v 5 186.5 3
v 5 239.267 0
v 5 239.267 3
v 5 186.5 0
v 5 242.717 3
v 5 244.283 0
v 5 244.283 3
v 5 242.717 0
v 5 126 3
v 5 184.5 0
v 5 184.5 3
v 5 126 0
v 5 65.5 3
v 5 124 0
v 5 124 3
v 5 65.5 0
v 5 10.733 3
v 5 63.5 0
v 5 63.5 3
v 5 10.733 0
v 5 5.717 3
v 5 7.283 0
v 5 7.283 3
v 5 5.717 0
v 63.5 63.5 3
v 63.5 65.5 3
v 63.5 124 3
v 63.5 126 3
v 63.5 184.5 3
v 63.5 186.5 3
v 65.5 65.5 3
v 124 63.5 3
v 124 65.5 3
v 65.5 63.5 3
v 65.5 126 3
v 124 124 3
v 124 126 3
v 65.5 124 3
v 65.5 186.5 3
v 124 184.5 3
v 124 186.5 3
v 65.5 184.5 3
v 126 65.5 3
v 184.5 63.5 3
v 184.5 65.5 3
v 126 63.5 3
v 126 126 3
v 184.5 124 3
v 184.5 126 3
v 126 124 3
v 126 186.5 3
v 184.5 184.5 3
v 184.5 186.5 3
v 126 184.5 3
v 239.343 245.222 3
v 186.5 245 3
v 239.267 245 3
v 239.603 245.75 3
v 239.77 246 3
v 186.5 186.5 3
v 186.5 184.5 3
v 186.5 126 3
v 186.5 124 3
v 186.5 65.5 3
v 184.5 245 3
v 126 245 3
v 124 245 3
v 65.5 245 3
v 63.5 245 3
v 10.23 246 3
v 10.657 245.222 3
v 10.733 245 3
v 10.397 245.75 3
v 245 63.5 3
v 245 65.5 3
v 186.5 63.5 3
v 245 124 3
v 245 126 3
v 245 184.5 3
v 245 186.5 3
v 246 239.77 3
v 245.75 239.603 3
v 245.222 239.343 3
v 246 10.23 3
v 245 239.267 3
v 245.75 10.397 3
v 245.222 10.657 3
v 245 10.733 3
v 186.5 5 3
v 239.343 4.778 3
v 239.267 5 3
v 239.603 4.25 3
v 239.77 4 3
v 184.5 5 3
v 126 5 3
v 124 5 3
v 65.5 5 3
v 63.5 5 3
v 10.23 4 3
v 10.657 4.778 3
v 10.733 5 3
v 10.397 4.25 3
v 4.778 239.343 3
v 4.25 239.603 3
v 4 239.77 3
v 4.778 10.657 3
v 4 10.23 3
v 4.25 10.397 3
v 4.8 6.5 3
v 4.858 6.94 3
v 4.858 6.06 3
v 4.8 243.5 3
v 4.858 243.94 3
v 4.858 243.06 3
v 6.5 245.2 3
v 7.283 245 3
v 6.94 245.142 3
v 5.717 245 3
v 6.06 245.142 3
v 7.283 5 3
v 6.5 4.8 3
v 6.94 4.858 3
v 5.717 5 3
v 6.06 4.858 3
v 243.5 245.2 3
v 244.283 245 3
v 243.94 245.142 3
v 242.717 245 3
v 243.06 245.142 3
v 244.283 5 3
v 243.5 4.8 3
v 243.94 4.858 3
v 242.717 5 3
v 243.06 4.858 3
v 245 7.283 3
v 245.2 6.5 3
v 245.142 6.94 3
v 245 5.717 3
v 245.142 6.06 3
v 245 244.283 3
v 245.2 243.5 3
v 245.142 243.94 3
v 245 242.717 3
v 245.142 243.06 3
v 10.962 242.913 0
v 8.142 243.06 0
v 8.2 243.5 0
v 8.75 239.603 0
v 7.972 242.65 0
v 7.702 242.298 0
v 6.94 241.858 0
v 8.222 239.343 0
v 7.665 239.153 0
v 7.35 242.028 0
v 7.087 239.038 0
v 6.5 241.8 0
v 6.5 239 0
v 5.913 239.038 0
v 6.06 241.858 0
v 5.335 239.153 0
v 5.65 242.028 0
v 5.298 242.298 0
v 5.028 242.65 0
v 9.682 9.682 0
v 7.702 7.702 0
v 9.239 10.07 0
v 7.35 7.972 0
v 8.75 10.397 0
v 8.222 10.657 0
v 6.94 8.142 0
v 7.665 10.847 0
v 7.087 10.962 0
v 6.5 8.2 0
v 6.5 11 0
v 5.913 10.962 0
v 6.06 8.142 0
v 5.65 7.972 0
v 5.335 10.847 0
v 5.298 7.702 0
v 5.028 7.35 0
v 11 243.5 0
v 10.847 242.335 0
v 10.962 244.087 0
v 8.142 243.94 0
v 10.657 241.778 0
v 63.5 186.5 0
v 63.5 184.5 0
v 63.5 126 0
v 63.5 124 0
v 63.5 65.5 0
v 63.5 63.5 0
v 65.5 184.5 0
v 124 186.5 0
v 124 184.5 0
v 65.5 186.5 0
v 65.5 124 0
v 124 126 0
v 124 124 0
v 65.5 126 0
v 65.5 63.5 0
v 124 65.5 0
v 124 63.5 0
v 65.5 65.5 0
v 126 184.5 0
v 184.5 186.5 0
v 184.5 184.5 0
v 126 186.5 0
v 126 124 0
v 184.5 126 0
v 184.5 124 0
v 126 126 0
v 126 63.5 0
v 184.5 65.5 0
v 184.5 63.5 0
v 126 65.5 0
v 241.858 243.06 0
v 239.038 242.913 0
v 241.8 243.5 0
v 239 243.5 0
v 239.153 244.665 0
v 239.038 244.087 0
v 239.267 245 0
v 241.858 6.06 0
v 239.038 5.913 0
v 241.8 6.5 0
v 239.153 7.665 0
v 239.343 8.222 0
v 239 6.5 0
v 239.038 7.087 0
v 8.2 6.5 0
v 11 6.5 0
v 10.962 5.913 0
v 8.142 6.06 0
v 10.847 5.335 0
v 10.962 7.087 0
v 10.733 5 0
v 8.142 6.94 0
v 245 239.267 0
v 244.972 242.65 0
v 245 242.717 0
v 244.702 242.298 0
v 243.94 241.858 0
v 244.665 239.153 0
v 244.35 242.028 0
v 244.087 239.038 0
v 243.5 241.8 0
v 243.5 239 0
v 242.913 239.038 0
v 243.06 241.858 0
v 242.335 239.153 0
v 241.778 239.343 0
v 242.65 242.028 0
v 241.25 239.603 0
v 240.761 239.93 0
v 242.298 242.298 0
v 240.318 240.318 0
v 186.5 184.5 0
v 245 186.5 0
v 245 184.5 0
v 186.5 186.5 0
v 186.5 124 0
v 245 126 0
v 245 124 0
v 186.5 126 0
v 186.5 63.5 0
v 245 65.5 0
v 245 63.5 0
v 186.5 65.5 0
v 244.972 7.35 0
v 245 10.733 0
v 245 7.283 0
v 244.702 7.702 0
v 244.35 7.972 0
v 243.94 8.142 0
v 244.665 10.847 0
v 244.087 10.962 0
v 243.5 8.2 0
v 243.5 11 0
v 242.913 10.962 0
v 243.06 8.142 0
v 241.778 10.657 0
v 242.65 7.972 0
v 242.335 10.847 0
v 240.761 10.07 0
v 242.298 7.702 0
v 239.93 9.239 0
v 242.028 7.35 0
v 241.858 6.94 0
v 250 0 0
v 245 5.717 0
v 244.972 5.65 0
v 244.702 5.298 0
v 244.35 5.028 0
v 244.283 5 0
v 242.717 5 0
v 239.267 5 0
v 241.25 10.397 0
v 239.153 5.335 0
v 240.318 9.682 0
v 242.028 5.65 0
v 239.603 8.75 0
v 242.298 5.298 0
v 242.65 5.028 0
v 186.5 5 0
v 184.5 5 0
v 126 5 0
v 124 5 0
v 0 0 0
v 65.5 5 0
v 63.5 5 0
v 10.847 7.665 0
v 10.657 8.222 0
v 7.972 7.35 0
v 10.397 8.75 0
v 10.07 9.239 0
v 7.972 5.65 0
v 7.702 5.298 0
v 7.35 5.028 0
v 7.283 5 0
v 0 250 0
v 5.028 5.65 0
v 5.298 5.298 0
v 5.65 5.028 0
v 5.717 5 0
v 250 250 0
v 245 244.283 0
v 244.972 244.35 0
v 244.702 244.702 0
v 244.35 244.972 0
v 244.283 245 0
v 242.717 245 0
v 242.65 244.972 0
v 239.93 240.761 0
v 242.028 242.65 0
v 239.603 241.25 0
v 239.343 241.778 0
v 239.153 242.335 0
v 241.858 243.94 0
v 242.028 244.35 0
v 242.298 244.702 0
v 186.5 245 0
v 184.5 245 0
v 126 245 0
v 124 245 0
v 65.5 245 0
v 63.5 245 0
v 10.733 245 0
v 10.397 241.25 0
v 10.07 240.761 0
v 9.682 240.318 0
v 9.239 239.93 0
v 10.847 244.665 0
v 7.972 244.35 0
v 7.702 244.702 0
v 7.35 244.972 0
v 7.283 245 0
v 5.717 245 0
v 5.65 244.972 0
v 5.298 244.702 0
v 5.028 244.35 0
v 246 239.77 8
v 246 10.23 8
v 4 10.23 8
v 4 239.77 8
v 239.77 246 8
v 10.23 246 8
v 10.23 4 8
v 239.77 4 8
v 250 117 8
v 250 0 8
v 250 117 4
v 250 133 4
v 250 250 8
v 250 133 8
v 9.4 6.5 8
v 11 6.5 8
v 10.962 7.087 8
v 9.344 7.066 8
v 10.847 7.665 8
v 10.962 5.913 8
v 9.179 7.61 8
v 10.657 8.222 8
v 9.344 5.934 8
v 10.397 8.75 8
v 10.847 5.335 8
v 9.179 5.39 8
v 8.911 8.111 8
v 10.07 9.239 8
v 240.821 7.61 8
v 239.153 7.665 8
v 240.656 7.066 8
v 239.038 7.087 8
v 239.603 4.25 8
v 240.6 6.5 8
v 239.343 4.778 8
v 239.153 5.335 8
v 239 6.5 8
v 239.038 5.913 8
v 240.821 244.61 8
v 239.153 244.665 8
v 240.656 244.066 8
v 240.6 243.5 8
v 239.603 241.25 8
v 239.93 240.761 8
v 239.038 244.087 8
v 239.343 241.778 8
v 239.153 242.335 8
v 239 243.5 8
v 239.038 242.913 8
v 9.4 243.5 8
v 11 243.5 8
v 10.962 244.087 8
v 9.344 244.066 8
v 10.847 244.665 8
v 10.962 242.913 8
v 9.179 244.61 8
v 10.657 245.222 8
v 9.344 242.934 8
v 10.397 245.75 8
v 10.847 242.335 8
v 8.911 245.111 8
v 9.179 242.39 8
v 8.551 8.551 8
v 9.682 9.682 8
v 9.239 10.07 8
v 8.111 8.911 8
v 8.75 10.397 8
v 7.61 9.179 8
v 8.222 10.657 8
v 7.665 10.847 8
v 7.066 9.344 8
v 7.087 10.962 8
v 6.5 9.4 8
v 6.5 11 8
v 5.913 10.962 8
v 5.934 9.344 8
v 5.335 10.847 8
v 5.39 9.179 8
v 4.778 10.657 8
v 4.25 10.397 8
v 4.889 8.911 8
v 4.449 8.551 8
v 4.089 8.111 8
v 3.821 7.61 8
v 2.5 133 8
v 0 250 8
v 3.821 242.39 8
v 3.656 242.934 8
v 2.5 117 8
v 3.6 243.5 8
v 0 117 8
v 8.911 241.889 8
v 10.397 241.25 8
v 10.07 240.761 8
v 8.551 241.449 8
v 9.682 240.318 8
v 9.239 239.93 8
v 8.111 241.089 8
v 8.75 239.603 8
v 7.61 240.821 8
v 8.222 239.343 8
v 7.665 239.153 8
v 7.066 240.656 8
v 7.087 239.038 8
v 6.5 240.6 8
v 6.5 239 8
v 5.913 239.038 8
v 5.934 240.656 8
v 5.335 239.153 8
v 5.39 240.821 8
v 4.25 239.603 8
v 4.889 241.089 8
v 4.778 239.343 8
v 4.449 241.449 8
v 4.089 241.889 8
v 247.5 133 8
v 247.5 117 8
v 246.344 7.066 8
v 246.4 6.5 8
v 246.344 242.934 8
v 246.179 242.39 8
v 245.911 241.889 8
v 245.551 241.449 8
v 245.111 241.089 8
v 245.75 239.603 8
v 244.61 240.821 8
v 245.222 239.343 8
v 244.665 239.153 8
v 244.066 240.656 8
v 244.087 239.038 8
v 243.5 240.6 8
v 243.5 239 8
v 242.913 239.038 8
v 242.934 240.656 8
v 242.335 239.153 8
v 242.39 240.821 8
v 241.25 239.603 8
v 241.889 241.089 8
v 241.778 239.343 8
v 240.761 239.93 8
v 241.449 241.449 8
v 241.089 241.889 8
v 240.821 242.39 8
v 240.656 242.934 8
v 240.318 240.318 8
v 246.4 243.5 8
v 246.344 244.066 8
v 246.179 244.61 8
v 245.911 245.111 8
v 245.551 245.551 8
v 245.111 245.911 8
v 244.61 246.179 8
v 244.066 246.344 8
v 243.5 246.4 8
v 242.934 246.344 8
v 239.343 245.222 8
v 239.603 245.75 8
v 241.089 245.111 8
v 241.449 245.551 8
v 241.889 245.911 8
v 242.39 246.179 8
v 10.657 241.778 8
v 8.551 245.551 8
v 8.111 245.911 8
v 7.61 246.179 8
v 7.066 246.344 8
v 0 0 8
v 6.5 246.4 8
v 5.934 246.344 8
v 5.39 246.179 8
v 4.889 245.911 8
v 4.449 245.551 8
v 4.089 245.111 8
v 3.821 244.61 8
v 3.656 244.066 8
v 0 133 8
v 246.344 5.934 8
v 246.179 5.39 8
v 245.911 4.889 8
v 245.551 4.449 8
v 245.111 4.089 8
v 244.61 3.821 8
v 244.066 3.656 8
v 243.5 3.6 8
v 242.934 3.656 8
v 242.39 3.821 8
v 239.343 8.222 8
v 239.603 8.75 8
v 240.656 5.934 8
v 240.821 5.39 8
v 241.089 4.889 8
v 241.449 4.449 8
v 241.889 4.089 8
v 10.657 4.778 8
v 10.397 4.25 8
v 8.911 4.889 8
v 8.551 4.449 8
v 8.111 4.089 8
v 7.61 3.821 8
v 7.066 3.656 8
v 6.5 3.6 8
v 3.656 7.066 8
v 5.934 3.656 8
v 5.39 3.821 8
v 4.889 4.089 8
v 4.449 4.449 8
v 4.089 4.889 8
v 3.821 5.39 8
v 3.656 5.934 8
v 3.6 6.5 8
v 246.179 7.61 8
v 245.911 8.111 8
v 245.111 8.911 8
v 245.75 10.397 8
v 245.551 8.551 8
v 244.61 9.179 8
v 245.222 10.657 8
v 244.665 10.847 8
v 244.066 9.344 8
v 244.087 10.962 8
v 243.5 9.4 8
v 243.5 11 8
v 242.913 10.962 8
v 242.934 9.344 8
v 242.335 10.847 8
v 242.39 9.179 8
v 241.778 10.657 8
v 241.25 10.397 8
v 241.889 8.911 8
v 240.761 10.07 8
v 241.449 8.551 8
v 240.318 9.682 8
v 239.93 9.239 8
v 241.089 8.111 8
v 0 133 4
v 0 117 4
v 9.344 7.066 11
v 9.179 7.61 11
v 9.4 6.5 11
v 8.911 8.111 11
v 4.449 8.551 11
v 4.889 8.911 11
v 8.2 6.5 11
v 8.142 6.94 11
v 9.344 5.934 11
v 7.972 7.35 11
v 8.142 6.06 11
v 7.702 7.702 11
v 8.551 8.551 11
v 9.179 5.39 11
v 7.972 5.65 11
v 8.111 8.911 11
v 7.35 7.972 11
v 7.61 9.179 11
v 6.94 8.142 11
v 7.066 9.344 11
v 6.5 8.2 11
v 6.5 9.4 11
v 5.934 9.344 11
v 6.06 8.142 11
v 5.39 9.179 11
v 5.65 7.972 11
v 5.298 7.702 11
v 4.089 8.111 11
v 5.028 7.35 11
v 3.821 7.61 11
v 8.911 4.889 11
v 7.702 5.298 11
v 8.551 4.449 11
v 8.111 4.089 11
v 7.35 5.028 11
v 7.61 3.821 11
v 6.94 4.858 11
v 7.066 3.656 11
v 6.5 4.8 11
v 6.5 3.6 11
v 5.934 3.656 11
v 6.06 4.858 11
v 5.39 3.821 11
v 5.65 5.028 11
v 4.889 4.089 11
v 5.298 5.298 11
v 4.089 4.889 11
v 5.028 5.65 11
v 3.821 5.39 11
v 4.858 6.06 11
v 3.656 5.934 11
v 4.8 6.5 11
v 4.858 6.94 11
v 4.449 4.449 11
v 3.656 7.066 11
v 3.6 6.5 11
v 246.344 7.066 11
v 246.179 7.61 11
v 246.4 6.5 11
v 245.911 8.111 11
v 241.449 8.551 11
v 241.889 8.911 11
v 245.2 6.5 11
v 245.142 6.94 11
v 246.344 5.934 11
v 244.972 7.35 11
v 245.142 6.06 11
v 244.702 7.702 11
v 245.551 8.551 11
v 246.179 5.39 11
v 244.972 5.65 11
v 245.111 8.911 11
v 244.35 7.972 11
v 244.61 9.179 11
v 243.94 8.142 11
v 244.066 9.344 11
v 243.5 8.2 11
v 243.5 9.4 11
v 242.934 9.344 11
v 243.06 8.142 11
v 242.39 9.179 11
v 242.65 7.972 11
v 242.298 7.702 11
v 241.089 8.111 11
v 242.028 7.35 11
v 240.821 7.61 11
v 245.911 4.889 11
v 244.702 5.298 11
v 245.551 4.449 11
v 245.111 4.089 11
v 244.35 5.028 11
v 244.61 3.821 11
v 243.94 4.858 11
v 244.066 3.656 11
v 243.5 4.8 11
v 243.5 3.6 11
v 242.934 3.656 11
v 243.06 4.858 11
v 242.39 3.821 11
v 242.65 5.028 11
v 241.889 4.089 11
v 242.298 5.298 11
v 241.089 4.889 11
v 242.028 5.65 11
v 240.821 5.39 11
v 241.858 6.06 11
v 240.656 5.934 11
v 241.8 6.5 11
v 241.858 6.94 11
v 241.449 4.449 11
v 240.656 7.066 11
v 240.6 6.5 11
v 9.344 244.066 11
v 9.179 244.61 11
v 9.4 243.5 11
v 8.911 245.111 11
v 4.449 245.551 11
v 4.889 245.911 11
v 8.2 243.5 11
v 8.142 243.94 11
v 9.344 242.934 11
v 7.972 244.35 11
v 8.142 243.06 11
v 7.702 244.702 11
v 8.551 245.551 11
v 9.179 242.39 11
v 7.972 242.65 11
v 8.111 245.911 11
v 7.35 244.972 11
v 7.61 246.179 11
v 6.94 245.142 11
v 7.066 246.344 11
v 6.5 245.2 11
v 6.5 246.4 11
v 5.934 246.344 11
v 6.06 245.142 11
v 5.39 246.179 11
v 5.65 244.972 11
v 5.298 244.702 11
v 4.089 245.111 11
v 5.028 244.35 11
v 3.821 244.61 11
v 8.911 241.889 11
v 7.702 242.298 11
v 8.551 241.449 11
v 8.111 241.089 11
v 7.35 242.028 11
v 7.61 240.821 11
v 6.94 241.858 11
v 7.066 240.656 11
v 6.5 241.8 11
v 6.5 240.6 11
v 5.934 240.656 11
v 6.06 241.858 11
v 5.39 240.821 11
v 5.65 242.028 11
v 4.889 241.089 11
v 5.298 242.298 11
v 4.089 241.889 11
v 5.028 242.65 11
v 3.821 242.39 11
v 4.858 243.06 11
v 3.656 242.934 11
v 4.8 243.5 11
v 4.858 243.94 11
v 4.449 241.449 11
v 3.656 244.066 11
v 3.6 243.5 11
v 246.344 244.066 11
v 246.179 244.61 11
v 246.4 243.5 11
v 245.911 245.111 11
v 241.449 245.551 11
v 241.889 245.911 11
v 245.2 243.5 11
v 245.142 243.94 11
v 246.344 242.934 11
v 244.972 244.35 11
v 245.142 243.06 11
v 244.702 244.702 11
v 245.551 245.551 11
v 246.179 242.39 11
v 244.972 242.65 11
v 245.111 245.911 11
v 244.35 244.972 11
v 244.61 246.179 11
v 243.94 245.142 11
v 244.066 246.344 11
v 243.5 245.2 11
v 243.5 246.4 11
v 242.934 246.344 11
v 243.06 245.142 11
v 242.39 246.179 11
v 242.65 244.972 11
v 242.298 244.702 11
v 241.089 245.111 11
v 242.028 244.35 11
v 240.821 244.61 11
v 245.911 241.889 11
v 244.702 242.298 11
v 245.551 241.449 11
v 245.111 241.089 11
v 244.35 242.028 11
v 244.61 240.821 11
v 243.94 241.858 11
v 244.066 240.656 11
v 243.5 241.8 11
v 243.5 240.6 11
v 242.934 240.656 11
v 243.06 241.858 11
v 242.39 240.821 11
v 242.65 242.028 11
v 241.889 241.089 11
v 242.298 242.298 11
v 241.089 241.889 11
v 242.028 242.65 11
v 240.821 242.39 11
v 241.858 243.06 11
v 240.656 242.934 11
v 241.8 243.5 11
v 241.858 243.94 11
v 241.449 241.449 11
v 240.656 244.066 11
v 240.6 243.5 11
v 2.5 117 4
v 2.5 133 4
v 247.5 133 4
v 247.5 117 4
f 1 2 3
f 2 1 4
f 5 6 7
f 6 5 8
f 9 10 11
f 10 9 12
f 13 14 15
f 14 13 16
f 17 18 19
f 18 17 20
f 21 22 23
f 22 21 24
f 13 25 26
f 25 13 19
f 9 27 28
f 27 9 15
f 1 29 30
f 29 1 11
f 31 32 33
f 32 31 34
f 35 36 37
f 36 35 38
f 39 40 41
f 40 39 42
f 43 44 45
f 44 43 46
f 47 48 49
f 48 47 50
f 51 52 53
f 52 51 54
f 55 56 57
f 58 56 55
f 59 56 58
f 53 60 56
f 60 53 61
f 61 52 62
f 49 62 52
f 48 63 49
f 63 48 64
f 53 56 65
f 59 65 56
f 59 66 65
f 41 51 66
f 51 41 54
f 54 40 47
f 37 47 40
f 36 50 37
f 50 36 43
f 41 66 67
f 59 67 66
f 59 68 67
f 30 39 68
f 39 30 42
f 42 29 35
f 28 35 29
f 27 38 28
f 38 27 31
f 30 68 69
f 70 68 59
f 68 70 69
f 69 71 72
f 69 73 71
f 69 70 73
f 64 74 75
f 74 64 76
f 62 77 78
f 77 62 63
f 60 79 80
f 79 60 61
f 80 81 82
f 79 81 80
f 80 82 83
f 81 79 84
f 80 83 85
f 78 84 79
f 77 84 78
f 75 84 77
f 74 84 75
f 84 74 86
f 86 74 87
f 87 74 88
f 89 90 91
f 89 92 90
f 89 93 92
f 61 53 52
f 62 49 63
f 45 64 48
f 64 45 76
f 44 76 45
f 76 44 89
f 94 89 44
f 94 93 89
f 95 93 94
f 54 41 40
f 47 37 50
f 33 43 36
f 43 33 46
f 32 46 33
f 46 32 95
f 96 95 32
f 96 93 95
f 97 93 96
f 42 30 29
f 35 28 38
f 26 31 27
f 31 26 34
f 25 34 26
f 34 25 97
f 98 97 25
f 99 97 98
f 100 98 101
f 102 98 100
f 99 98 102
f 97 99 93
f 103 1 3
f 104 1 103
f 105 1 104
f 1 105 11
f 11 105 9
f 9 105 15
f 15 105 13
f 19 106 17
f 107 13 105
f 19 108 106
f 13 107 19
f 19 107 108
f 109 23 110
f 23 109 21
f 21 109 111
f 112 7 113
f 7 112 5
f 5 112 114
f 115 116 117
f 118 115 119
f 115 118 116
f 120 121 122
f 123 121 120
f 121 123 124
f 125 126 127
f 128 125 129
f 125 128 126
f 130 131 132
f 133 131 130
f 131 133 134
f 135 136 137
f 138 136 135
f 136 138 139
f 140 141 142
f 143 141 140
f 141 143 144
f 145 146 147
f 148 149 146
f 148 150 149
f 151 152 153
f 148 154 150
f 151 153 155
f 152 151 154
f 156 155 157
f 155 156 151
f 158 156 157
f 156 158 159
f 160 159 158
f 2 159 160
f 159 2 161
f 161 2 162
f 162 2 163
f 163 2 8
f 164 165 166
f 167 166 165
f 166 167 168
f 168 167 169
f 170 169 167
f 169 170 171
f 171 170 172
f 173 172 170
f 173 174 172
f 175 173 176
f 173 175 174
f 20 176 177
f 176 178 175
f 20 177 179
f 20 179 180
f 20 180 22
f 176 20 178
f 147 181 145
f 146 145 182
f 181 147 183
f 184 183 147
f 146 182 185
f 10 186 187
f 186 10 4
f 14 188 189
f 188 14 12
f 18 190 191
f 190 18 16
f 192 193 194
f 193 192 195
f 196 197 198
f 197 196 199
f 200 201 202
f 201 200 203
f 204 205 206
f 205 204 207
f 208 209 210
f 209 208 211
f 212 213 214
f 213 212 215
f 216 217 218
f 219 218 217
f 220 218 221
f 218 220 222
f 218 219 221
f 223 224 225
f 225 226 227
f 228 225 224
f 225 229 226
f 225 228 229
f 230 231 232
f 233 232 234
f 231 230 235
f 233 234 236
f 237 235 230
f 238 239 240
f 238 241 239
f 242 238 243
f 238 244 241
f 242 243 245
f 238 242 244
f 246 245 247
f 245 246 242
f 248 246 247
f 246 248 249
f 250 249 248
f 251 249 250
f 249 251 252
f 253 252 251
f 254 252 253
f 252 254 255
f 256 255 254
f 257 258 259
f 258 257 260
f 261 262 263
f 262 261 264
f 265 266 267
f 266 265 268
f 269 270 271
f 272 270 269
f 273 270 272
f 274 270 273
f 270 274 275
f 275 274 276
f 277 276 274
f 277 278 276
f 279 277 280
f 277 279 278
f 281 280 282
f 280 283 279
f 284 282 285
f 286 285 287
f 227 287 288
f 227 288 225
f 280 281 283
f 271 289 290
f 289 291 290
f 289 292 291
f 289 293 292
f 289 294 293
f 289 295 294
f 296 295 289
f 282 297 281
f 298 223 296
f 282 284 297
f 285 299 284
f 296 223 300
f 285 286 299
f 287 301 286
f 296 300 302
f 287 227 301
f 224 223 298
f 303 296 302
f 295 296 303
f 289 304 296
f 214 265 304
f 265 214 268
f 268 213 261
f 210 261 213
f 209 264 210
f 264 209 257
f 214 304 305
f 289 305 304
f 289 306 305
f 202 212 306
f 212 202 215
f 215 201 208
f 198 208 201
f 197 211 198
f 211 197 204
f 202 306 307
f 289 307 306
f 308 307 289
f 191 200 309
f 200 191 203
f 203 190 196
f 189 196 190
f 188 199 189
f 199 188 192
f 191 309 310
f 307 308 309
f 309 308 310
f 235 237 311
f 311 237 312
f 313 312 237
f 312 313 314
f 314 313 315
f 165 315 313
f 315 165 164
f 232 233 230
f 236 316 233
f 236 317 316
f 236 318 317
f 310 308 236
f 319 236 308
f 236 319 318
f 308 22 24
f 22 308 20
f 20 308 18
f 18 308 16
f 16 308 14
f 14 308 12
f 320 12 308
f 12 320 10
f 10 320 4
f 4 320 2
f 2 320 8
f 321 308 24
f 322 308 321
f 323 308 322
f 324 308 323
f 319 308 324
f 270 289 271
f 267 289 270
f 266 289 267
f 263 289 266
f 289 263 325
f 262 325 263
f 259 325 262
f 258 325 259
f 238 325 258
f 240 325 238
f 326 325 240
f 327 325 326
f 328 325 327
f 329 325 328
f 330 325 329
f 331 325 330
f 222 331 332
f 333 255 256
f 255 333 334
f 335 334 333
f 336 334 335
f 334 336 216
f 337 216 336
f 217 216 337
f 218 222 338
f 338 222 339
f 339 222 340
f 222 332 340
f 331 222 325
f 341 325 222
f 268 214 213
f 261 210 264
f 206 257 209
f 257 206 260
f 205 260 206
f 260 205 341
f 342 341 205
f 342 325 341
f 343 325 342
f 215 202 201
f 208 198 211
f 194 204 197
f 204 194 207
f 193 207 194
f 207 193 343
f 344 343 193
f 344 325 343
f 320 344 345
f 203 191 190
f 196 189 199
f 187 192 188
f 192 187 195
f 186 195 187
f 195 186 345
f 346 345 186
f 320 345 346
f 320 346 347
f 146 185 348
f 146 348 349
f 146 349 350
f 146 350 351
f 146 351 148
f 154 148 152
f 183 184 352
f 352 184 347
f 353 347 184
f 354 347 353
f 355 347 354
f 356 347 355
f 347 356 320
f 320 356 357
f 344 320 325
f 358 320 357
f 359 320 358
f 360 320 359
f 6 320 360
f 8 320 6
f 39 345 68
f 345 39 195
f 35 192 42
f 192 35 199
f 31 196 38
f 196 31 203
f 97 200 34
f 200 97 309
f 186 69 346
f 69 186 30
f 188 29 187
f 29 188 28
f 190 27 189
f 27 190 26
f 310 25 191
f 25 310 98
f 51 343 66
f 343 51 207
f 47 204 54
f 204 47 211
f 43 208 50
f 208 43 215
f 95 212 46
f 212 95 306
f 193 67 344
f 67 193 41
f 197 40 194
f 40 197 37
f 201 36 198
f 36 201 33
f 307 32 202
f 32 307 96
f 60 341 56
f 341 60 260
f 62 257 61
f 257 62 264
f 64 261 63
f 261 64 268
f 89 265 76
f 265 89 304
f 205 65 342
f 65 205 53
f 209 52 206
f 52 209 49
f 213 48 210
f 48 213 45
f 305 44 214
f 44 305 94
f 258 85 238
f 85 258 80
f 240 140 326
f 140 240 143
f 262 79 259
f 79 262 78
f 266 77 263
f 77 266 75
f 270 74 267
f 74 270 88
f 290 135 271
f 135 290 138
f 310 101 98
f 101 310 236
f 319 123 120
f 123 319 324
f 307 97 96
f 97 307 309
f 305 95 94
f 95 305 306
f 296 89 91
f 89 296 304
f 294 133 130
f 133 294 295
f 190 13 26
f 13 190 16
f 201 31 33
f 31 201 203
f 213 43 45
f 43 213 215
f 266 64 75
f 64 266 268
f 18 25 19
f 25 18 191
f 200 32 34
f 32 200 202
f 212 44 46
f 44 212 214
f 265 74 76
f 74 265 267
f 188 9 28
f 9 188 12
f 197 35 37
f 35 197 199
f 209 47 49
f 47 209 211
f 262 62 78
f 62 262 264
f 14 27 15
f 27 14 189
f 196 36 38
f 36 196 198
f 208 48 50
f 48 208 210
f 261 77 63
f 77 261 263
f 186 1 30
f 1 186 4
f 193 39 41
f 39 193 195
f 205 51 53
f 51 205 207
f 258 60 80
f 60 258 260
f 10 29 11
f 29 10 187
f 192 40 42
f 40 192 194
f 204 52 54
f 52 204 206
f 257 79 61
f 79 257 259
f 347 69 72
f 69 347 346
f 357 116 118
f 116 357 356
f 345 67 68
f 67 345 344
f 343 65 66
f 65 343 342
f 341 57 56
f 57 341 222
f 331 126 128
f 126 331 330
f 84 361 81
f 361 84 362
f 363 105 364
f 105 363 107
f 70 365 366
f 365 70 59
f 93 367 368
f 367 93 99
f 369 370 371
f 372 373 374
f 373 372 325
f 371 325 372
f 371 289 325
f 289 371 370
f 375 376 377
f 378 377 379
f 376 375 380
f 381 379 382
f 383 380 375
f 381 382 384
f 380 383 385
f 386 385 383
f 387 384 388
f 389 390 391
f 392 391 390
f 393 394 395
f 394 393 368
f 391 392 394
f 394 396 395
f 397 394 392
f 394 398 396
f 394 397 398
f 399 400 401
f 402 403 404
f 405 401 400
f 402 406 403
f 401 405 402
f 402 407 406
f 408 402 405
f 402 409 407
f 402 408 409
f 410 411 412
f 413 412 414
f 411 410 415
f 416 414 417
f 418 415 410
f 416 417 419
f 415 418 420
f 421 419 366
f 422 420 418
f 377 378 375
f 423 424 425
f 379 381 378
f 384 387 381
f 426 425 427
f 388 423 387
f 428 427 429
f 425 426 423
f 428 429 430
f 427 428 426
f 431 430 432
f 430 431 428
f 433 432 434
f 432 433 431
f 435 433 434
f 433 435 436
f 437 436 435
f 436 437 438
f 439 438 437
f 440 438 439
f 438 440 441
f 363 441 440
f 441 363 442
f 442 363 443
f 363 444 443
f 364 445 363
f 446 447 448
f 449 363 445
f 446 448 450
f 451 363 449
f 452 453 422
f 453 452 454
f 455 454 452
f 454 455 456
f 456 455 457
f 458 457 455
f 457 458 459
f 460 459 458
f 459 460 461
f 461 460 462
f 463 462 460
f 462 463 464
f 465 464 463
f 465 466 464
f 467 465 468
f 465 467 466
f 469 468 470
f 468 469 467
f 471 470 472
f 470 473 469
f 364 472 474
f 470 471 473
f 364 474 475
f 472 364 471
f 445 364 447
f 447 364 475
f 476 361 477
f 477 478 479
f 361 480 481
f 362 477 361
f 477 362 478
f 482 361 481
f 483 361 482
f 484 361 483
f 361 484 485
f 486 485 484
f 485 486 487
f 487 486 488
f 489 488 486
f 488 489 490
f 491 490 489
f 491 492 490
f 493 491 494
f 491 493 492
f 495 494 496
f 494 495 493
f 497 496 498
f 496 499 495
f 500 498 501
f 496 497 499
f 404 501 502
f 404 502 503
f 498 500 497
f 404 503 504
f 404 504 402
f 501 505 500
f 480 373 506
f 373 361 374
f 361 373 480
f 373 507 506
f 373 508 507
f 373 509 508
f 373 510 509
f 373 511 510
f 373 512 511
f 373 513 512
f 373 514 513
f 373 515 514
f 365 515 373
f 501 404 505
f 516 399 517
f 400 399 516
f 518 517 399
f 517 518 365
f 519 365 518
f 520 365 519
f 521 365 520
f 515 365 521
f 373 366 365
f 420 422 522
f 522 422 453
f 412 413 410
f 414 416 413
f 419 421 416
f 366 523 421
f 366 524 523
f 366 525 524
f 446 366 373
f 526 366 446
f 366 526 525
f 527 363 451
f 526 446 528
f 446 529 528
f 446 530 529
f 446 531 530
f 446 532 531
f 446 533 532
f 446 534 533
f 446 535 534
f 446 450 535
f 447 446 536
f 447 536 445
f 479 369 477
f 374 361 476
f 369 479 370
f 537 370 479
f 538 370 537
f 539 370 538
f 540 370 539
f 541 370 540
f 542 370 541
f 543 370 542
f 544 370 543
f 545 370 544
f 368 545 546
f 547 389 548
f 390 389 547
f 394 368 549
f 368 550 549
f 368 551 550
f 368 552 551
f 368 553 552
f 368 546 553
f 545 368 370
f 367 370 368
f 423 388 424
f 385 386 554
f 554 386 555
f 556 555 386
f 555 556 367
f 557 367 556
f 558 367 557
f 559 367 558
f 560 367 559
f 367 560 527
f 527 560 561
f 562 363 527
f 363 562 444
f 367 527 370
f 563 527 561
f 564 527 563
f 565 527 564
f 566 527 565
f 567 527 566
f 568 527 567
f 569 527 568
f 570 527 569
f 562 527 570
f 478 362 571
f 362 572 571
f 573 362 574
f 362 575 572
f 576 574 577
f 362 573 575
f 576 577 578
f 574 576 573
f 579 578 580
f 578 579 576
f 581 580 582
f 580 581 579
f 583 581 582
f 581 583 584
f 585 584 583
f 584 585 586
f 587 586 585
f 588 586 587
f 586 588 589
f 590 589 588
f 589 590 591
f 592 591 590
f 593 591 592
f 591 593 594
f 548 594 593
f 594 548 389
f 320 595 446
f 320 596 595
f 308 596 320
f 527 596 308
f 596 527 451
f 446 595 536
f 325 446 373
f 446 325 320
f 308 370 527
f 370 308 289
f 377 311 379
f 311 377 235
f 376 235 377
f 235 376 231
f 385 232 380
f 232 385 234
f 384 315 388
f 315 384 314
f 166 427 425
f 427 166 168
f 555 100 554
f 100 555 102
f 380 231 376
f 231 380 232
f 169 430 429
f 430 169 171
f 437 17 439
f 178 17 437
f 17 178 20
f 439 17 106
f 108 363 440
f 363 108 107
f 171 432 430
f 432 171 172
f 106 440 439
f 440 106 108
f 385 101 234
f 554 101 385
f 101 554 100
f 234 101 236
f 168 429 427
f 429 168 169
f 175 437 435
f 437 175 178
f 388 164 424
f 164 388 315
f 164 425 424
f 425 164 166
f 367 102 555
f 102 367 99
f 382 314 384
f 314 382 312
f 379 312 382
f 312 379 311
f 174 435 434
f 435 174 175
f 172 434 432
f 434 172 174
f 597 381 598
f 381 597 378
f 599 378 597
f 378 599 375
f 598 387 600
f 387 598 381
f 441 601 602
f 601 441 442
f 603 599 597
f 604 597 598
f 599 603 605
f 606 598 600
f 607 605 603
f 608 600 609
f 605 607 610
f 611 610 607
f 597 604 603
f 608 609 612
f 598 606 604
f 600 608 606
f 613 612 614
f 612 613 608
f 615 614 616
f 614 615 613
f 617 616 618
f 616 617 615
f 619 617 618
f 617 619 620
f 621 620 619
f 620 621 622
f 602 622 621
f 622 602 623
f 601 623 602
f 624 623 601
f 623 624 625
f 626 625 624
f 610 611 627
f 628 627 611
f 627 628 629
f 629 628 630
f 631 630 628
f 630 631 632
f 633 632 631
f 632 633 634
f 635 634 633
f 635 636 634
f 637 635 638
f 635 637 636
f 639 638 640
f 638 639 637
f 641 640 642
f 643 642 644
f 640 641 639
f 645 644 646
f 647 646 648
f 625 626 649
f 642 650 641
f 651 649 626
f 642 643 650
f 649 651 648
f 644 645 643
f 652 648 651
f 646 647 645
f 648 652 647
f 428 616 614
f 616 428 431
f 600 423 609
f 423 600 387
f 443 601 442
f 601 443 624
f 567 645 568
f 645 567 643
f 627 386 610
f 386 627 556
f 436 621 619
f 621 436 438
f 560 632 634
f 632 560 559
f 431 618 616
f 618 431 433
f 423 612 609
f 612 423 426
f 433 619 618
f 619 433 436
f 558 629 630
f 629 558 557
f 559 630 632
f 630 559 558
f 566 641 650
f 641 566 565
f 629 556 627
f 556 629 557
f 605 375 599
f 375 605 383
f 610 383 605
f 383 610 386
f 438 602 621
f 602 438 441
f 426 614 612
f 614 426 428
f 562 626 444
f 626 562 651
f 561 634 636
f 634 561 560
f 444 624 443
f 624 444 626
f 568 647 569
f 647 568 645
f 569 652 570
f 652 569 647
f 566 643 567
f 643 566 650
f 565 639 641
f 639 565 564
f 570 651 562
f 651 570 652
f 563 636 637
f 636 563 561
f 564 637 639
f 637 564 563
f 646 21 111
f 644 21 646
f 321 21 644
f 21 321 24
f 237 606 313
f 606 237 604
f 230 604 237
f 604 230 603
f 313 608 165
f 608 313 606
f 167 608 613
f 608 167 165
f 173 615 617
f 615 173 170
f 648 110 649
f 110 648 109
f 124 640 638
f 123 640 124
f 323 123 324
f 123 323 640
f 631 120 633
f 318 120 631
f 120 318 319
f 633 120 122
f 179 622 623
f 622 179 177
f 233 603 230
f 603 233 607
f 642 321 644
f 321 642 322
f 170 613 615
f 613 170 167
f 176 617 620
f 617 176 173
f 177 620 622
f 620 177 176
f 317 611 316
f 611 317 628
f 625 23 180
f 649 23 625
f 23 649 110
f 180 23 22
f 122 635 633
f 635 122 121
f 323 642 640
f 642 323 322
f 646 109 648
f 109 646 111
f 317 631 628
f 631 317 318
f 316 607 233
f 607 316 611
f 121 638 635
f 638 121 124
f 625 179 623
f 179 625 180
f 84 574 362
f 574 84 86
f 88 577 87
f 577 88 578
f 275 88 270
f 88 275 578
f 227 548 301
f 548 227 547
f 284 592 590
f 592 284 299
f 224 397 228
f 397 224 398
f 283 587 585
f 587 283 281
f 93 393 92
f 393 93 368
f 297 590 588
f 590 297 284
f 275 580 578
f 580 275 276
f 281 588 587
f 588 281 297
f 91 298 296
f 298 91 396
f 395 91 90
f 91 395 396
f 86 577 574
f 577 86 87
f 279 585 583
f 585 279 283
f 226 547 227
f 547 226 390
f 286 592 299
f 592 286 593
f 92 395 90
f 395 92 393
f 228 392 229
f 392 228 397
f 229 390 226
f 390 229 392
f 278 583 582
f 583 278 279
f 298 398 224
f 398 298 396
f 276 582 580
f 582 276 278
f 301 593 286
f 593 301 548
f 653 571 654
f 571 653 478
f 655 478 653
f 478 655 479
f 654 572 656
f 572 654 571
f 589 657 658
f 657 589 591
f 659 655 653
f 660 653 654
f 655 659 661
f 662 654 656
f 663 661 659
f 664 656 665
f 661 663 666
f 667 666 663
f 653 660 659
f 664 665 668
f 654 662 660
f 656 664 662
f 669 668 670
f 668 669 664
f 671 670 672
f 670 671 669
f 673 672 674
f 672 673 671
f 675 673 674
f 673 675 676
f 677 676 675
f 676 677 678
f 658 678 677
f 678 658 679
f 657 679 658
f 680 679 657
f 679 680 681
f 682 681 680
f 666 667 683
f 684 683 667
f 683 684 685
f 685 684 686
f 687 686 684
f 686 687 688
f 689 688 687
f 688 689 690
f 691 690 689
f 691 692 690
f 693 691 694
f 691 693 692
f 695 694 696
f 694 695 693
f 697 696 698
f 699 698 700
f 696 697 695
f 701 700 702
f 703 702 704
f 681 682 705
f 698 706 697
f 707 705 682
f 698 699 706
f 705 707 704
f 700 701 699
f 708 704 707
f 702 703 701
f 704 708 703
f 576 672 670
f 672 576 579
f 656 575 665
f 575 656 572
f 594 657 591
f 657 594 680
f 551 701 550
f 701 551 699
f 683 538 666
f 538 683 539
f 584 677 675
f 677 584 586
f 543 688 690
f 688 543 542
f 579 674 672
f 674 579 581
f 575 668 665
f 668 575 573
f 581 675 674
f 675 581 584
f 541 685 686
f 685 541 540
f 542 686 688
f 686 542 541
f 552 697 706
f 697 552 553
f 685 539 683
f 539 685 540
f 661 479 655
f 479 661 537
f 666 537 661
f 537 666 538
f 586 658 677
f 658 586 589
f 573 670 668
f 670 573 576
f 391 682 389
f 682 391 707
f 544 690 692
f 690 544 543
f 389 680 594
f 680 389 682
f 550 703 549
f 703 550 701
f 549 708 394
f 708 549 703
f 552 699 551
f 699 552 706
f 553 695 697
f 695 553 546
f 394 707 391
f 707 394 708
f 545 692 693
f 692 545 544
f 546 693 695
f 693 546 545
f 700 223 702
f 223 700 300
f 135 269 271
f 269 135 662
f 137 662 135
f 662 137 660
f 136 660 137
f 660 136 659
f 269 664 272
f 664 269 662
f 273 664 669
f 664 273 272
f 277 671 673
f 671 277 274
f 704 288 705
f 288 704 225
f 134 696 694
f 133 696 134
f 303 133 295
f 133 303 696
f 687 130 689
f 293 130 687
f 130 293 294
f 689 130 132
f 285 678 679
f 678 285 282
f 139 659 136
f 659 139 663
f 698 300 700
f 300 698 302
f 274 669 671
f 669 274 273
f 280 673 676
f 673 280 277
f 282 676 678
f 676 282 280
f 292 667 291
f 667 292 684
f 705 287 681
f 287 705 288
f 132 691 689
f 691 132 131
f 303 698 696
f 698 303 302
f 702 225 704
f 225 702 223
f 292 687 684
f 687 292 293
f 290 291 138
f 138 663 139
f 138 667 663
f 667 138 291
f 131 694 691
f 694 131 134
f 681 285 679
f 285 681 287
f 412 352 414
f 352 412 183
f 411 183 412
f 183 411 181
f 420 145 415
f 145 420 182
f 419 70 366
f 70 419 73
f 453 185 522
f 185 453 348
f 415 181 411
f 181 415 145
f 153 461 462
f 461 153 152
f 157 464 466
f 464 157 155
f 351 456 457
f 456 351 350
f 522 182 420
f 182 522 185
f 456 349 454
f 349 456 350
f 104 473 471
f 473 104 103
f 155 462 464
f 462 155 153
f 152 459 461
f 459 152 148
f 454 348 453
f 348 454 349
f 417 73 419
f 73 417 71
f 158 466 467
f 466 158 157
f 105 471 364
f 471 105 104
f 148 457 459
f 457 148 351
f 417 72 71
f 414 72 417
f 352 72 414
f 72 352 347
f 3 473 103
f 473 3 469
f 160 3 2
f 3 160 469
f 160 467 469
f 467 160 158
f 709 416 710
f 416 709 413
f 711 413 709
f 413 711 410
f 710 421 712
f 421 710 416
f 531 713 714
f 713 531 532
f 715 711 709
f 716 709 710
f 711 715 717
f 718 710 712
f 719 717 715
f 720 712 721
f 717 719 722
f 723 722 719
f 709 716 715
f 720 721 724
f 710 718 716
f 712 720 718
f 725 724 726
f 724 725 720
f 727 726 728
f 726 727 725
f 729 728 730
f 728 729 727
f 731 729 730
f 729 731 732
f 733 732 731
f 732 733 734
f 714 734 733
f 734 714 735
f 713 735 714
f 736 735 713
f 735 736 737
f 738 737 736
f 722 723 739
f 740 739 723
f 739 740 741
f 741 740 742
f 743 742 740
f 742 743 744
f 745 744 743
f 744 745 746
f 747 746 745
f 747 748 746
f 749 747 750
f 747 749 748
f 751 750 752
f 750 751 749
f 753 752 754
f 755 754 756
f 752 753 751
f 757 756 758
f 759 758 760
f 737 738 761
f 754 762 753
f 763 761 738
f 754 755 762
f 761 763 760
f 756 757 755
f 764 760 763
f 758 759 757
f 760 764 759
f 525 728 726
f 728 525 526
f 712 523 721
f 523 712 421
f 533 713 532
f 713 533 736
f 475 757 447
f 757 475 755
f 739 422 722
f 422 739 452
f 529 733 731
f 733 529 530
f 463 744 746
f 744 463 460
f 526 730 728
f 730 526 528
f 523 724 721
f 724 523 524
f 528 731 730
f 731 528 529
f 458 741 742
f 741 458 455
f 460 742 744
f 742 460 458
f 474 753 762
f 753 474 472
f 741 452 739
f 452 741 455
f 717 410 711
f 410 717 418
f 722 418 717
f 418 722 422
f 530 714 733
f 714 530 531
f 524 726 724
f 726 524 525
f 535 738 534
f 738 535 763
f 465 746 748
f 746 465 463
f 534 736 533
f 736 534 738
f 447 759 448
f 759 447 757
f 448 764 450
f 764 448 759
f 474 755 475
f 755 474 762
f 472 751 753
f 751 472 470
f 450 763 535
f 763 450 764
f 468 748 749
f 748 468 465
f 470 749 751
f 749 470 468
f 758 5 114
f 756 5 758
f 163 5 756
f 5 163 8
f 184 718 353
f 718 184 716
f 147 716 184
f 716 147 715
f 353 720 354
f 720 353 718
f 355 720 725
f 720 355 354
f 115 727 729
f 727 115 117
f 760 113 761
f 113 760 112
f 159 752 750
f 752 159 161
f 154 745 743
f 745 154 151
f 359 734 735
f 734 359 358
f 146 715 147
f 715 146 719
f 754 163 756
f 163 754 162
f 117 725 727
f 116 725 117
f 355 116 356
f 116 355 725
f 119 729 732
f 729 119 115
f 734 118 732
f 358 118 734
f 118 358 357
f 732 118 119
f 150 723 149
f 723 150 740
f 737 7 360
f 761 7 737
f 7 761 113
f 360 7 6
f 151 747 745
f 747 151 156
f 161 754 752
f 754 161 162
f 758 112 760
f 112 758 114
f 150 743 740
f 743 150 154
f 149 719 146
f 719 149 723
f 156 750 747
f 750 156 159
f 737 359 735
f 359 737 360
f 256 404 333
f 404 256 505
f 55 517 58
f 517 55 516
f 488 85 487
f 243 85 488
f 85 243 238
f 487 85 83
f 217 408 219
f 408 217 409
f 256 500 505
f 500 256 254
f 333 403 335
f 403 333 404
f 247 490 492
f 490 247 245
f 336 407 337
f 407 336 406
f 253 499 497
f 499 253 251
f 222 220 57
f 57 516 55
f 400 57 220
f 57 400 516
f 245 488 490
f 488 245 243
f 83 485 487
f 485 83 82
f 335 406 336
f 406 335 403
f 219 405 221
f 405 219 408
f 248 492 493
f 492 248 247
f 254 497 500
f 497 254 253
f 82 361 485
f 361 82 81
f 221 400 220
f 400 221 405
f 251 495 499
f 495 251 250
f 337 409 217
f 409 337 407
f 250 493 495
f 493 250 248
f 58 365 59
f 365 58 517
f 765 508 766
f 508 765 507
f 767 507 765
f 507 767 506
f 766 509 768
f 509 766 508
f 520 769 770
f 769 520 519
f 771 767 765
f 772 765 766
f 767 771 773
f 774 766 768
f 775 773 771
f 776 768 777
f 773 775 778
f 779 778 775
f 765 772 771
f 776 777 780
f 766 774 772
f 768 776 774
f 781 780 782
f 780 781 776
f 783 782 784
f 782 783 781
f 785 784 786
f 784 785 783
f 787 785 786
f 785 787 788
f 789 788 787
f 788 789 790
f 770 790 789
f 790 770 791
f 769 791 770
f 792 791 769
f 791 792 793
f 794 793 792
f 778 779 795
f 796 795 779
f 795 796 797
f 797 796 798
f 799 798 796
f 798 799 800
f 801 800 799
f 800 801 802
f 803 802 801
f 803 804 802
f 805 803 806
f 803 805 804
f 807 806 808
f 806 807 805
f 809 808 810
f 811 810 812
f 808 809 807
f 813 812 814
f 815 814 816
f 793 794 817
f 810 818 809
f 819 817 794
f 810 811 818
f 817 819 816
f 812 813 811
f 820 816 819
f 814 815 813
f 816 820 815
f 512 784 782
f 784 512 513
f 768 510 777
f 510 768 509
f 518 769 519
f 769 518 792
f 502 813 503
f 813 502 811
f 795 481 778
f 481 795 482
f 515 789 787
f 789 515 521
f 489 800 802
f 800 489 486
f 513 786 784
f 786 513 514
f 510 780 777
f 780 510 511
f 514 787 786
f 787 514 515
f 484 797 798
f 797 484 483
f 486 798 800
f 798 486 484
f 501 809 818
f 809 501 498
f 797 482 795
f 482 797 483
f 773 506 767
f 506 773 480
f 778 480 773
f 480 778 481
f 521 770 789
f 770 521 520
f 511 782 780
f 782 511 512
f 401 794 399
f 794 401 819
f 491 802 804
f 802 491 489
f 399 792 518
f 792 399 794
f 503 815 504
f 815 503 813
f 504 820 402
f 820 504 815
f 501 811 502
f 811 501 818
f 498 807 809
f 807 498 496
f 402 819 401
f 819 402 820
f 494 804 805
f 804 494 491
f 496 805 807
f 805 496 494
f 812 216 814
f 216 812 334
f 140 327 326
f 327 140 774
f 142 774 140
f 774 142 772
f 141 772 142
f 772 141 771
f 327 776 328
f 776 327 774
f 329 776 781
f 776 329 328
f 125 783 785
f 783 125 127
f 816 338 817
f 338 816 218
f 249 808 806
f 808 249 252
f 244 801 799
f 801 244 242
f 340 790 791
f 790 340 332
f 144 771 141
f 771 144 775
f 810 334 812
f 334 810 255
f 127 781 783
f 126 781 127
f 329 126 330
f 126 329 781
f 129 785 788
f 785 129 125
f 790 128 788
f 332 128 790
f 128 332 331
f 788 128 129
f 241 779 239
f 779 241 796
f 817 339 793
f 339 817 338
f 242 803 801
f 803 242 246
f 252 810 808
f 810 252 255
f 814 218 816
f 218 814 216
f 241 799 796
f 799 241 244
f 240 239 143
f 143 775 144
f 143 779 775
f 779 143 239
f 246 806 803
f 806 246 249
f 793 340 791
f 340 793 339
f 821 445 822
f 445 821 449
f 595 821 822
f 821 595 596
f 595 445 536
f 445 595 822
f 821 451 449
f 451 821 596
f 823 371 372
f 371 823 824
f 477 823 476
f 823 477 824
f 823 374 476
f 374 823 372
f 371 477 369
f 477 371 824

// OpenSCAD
// =====================================================================
// FUZE / Helios — Down Sandwich Test Frame  (V3 clamshell, 2026-06-04)
// Two separate halves, NO printed hinge. Lift the lid right off to lay an
// even layer of free-form down in the tray; set the lid back (a perimeter
// set the lid back and clamp with 4 corner screws. Mesh on BOTH outer
// faces. Hangs vertically: a top rail slides into a side-loading C-channel.
//
//   PART = "tray"    -> deep half (10 mm down cavity)        [print 1]
//   PART = "lid"     -> mesh lid half                        [print 1]
//   PART = "channel" -> side-loading C-channel (load cell)   [print 1]
//   PART = "both"    -> tray + lid + channel preview
//
// Material: PC (PETG later). Print each half FLAT, mesh-face DOWN.
// MESH: pause-embed at layer 8 = Z 1.5 mm @ 0.2 mm layers (both halves).
// =====================================================================

PART = "lid";
$fn = 48;

SIZE     = 250;     // outer square (mm)
WALL     = 4;       // frame wall thickness
CAV      = 10;      // down cavity depth (tray)
FLOOR_H  = 3.0;     // mesh-support rib plane (1.5 backing + 1.5 cap, mesh @ layer 8)
RIB_W    = 2.0;     // rib width
CELLS    = 4;       // NxN support-rib cells
CLR      = 0.4;     // fit clearance

TRAY_T = FLOOR_H + CAV;   // tray wall height (13)
LID_RIM = 5.0;            // lid wall height
LID_T   = FLOOR_H + LID_RIM;


// corner closure screws (M3)
SCREW_CLR = 3.4;    // clearance hole (lid)
INSERT_D  = 4.2;    // M3 heat-set insert bore (tray)
INSERT_H  = 6.0;
BOSS_D    = 9;
INSET     = BOSS_D/2 + 2;   // boss center inset from the corner

// top hang tab (flat, in the plane of the frame, sticks OUT past the top edge so
// it never conflicts with the lid) + side-loading C-channel that grips the tab.
RAIL_LEN = 150;   // tab width along the top edge (X)
RAIL_OUT = 16;    // how far the tab sticks out past the top edge (Y)
RAIL_T   = 6;     // tab thickness (Z) — what the channel grips
CH_CLR = 0.5; CH_WALL = 3; CH_LEN = RAIL_LEN + 30;
// locking pins: 2 holes through channel-lip + tab + channel-lip; drop M3 screws/pins
LOCK_D    = 3.4;          // M3 clearance / 3 mm pin
LOCK_SP   = 90;           // spacing between the 2 lock holes
LOCK_Y    = RAIL_OUT/2;   // depth into the tab where the holes sit

WIN = SIZE - 2*WALL;
EPS = 0.01;

// ---------------------------------------------------------------
module sq(s,h){ cube([s,s,h]); }

module rib_grid(h){
    step = WIN/CELLS;
    intersection(){
        union(){
            for(i=[0:CELLS]) translate([i*step-RIB_W/2,0,0]) cube([RIB_W,WIN,h]);
            for(j=[0:CELLS]) translate([0,j*step-RIB_W/2,0]) cube([WIN,RIB_W,h]);
        }
        cube([WIN,WIN,h]);
    }
}
module ring(h){ difference(){ sq(SIZE,h); translate([WALL,WALL,-EPS]) sq(WIN,h+2*EPS);} }

// 4 corner positions
function corners() = [[INSET,INSET],[SIZE-INSET,INSET],[INSET,SIZE-INSET],[SIZE-INSET,SIZE-INSET]];

// registration via the corner bosses: lid POST drops into tray SOCKET, then screw.
// Socket and post are DECOUPLED so the post can shrink without re-cutting the tray.
REG_SOCKET_D = 6.8;   // TRAY socket diameter — UNCHANGED (matches the 6 trays already printed)
REG_POST_D   = 5.8;   // LID post diameter — loose slip fit (~0.5mm/side; was 6.5 = too tight)
REG_H        = 3.0;   // engagement depth (socket depth = post height)

module tray_bosses(){          // socket on top (receives the lid post) + insert below it
    for(c=corners()) translate([c[0],c[1],0])
        difference(){
            cylinder(d=BOSS_D,h=TRAY_T);
            translate([0,0,TRAY_T-REG_H]) cylinder(d=REG_SOCKET_D, h=REG_H+EPS, $fn=32);           // registration socket
            translate([0,0,TRAY_T-REG_H-INSERT_H]) cylinder(d=INSERT_D, h=INSERT_H+EPS, $fn=24);   // heat-set insert bore (below socket)
        }
}
module lid_bosses(){           // boss + registration POST above the mating face; screw hole through
    for(c=corners()) translate([c[0],c[1],0])
        difference(){
            union(){ cylinder(d=BOSS_D,h=LID_T); translate([0,0,LID_T-EPS]) cylinder(d=REG_POST_D, h=REG_H+EPS, $fn=32); }
            translate([0,0,-EPS]) cylinder(d=SCREW_CLR, h=LID_T+REG_H+2*EPS, $fn=24);
        }
}

// Flat hang tab: a plate sticking OUT past the top edge (+Y), thickness in Z.
// Sits at the top of the tray wall so the lid (which stacks in +Z) clears it.
module hang_tab(){
    difference(){
        translate([(SIZE-RAIL_LEN)/2, SIZE-EPS, TRAY_T-RAIL_T])
            cube([RAIL_LEN, RAIL_OUT+EPS, RAIL_T]);
        for(sx=[SIZE/2-LOCK_SP/2, SIZE/2+LOCK_SP/2])
            translate([sx, SIZE+LOCK_Y, TRAY_T-RAIL_T-EPS]) cylinder(d=LOCK_D, h=RAIL_T+2*EPS, $fn=24);
    }
}
// C-channel grips the tab top+bottom (Z) and the back (Y); the tab slides in from
// one X end to an end-stop; the front (toward the frame) is open so the neck passes.
module c_channel(){
    slotY = RAIL_OUT + CH_CLR;            // tab depth into the channel (Y)
    slotZ = RAIL_T + CH_CLR;              // tab thickness (Z)
    outerY = slotY + CH_WALL;             // back wall
    outerZ = slotZ + 2*CH_WALL;           // top + bottom lips
    difference(){
        cube([CH_LEN, outerY, outerZ]);
        // pocket: open at X=0 (insert) and at Y=0 (front, frame neck passes); far X end = stop
        translate([-EPS, -EPS, CH_WALL]) cube([CH_LEN-CH_WALL, slotY, slotZ]);
        // mount holes on the back flange to bolt onto the inverted load cell
        for(x=[CH_LEN*0.3,CH_LEN*0.7]) translate([x, outerY+EPS, outerZ/2]) rotate([90,0,0]) cylinder(d=4.3,h=CH_WALL+2*EPS,$fn=24);
        // LOCK holes: vertical, through top lip + tab + bottom lip, aligned when the
        // tab is fully seated against the end-stop. Drop in 2 M3 screws/pins to lock.
        for(sx=[(CH_LEN-CH_WALL)-RAIL_LEN/2 - LOCK_SP/2, (CH_LEN-CH_WALL)-RAIL_LEN/2 + LOCK_SP/2])
            translate([sx, LOCK_Y, -EPS]) cylinder(d=LOCK_D, h=outerZ+2*EPS, $fn=24);
    }
}

// ---------------- HALVES ----------------
module tray_half(){
    union(){
        translate([WALL,WALL,0]) rib_grid(FLOOR_H);
        ring(TRAY_T);
        tray_bosses();
        hang_tab();
    }
}
// coin-pry notches: bites out of the lid's top-outer edge at 2 opposite sides, so a
// coin/flat screwdriver slides into the seam against the tray edge and twists to pop apart.
PRY_W = 16; PRY_DEEP = 2.5; PRY_H = 4;
module pry_notches(){
    yc = SIZE/2;
    translate([-EPS,        yc-PRY_W/2, LID_T-PRY_H]) cube([PRY_DEEP+EPS, PRY_W, PRY_H+2*EPS]);   // left edge
    translate([SIZE-PRY_DEEP, yc-PRY_W/2, LID_T-PRY_H]) cube([PRY_DEEP+EPS, PRY_W, PRY_H+2*EPS]); // right edge
}
module lid_half(){
    difference(){
        union(){
            translate([WALL,WALL,0]) rib_grid(FLOOR_H);
            ring(LID_T);
            lid_bosses();
        }
        pry_notches();
    }
}

// ---------------- selector ----------------
if      (PART=="tray")    tray_half();
else if (PART=="lid")     lid_half();
else if (PART=="channel") c_channel();
else { tray_half(); translate([SIZE+30,0,0]) lid_half(); translate([0,-70,0]) c_channel(); }

// =====================================================================
// ASSEMBLY
// 1. Print tray + lid (mesh-face DOWN, pause layer 8 for mesh) + 1 C-channel, PC.
// 2. Stretch/embed bridal mesh on each rib grid.
// 3. Press 4x M3 heat-set inserts into the tray corner bosses.
// 4. Lay a standardized small even down layer in the tray. Set the lid on — the
//    align the 4 corner boss holes and drive 4x M3 into the tray inserts.
// 5. Bolt the C-channel to the inverted load cell; slide the tray's top rail in
//    from the open end to the end-stop; tare; run protocol.
// To reload: back out the 4 screws, lift the lid straight off.
// =====================================================================
